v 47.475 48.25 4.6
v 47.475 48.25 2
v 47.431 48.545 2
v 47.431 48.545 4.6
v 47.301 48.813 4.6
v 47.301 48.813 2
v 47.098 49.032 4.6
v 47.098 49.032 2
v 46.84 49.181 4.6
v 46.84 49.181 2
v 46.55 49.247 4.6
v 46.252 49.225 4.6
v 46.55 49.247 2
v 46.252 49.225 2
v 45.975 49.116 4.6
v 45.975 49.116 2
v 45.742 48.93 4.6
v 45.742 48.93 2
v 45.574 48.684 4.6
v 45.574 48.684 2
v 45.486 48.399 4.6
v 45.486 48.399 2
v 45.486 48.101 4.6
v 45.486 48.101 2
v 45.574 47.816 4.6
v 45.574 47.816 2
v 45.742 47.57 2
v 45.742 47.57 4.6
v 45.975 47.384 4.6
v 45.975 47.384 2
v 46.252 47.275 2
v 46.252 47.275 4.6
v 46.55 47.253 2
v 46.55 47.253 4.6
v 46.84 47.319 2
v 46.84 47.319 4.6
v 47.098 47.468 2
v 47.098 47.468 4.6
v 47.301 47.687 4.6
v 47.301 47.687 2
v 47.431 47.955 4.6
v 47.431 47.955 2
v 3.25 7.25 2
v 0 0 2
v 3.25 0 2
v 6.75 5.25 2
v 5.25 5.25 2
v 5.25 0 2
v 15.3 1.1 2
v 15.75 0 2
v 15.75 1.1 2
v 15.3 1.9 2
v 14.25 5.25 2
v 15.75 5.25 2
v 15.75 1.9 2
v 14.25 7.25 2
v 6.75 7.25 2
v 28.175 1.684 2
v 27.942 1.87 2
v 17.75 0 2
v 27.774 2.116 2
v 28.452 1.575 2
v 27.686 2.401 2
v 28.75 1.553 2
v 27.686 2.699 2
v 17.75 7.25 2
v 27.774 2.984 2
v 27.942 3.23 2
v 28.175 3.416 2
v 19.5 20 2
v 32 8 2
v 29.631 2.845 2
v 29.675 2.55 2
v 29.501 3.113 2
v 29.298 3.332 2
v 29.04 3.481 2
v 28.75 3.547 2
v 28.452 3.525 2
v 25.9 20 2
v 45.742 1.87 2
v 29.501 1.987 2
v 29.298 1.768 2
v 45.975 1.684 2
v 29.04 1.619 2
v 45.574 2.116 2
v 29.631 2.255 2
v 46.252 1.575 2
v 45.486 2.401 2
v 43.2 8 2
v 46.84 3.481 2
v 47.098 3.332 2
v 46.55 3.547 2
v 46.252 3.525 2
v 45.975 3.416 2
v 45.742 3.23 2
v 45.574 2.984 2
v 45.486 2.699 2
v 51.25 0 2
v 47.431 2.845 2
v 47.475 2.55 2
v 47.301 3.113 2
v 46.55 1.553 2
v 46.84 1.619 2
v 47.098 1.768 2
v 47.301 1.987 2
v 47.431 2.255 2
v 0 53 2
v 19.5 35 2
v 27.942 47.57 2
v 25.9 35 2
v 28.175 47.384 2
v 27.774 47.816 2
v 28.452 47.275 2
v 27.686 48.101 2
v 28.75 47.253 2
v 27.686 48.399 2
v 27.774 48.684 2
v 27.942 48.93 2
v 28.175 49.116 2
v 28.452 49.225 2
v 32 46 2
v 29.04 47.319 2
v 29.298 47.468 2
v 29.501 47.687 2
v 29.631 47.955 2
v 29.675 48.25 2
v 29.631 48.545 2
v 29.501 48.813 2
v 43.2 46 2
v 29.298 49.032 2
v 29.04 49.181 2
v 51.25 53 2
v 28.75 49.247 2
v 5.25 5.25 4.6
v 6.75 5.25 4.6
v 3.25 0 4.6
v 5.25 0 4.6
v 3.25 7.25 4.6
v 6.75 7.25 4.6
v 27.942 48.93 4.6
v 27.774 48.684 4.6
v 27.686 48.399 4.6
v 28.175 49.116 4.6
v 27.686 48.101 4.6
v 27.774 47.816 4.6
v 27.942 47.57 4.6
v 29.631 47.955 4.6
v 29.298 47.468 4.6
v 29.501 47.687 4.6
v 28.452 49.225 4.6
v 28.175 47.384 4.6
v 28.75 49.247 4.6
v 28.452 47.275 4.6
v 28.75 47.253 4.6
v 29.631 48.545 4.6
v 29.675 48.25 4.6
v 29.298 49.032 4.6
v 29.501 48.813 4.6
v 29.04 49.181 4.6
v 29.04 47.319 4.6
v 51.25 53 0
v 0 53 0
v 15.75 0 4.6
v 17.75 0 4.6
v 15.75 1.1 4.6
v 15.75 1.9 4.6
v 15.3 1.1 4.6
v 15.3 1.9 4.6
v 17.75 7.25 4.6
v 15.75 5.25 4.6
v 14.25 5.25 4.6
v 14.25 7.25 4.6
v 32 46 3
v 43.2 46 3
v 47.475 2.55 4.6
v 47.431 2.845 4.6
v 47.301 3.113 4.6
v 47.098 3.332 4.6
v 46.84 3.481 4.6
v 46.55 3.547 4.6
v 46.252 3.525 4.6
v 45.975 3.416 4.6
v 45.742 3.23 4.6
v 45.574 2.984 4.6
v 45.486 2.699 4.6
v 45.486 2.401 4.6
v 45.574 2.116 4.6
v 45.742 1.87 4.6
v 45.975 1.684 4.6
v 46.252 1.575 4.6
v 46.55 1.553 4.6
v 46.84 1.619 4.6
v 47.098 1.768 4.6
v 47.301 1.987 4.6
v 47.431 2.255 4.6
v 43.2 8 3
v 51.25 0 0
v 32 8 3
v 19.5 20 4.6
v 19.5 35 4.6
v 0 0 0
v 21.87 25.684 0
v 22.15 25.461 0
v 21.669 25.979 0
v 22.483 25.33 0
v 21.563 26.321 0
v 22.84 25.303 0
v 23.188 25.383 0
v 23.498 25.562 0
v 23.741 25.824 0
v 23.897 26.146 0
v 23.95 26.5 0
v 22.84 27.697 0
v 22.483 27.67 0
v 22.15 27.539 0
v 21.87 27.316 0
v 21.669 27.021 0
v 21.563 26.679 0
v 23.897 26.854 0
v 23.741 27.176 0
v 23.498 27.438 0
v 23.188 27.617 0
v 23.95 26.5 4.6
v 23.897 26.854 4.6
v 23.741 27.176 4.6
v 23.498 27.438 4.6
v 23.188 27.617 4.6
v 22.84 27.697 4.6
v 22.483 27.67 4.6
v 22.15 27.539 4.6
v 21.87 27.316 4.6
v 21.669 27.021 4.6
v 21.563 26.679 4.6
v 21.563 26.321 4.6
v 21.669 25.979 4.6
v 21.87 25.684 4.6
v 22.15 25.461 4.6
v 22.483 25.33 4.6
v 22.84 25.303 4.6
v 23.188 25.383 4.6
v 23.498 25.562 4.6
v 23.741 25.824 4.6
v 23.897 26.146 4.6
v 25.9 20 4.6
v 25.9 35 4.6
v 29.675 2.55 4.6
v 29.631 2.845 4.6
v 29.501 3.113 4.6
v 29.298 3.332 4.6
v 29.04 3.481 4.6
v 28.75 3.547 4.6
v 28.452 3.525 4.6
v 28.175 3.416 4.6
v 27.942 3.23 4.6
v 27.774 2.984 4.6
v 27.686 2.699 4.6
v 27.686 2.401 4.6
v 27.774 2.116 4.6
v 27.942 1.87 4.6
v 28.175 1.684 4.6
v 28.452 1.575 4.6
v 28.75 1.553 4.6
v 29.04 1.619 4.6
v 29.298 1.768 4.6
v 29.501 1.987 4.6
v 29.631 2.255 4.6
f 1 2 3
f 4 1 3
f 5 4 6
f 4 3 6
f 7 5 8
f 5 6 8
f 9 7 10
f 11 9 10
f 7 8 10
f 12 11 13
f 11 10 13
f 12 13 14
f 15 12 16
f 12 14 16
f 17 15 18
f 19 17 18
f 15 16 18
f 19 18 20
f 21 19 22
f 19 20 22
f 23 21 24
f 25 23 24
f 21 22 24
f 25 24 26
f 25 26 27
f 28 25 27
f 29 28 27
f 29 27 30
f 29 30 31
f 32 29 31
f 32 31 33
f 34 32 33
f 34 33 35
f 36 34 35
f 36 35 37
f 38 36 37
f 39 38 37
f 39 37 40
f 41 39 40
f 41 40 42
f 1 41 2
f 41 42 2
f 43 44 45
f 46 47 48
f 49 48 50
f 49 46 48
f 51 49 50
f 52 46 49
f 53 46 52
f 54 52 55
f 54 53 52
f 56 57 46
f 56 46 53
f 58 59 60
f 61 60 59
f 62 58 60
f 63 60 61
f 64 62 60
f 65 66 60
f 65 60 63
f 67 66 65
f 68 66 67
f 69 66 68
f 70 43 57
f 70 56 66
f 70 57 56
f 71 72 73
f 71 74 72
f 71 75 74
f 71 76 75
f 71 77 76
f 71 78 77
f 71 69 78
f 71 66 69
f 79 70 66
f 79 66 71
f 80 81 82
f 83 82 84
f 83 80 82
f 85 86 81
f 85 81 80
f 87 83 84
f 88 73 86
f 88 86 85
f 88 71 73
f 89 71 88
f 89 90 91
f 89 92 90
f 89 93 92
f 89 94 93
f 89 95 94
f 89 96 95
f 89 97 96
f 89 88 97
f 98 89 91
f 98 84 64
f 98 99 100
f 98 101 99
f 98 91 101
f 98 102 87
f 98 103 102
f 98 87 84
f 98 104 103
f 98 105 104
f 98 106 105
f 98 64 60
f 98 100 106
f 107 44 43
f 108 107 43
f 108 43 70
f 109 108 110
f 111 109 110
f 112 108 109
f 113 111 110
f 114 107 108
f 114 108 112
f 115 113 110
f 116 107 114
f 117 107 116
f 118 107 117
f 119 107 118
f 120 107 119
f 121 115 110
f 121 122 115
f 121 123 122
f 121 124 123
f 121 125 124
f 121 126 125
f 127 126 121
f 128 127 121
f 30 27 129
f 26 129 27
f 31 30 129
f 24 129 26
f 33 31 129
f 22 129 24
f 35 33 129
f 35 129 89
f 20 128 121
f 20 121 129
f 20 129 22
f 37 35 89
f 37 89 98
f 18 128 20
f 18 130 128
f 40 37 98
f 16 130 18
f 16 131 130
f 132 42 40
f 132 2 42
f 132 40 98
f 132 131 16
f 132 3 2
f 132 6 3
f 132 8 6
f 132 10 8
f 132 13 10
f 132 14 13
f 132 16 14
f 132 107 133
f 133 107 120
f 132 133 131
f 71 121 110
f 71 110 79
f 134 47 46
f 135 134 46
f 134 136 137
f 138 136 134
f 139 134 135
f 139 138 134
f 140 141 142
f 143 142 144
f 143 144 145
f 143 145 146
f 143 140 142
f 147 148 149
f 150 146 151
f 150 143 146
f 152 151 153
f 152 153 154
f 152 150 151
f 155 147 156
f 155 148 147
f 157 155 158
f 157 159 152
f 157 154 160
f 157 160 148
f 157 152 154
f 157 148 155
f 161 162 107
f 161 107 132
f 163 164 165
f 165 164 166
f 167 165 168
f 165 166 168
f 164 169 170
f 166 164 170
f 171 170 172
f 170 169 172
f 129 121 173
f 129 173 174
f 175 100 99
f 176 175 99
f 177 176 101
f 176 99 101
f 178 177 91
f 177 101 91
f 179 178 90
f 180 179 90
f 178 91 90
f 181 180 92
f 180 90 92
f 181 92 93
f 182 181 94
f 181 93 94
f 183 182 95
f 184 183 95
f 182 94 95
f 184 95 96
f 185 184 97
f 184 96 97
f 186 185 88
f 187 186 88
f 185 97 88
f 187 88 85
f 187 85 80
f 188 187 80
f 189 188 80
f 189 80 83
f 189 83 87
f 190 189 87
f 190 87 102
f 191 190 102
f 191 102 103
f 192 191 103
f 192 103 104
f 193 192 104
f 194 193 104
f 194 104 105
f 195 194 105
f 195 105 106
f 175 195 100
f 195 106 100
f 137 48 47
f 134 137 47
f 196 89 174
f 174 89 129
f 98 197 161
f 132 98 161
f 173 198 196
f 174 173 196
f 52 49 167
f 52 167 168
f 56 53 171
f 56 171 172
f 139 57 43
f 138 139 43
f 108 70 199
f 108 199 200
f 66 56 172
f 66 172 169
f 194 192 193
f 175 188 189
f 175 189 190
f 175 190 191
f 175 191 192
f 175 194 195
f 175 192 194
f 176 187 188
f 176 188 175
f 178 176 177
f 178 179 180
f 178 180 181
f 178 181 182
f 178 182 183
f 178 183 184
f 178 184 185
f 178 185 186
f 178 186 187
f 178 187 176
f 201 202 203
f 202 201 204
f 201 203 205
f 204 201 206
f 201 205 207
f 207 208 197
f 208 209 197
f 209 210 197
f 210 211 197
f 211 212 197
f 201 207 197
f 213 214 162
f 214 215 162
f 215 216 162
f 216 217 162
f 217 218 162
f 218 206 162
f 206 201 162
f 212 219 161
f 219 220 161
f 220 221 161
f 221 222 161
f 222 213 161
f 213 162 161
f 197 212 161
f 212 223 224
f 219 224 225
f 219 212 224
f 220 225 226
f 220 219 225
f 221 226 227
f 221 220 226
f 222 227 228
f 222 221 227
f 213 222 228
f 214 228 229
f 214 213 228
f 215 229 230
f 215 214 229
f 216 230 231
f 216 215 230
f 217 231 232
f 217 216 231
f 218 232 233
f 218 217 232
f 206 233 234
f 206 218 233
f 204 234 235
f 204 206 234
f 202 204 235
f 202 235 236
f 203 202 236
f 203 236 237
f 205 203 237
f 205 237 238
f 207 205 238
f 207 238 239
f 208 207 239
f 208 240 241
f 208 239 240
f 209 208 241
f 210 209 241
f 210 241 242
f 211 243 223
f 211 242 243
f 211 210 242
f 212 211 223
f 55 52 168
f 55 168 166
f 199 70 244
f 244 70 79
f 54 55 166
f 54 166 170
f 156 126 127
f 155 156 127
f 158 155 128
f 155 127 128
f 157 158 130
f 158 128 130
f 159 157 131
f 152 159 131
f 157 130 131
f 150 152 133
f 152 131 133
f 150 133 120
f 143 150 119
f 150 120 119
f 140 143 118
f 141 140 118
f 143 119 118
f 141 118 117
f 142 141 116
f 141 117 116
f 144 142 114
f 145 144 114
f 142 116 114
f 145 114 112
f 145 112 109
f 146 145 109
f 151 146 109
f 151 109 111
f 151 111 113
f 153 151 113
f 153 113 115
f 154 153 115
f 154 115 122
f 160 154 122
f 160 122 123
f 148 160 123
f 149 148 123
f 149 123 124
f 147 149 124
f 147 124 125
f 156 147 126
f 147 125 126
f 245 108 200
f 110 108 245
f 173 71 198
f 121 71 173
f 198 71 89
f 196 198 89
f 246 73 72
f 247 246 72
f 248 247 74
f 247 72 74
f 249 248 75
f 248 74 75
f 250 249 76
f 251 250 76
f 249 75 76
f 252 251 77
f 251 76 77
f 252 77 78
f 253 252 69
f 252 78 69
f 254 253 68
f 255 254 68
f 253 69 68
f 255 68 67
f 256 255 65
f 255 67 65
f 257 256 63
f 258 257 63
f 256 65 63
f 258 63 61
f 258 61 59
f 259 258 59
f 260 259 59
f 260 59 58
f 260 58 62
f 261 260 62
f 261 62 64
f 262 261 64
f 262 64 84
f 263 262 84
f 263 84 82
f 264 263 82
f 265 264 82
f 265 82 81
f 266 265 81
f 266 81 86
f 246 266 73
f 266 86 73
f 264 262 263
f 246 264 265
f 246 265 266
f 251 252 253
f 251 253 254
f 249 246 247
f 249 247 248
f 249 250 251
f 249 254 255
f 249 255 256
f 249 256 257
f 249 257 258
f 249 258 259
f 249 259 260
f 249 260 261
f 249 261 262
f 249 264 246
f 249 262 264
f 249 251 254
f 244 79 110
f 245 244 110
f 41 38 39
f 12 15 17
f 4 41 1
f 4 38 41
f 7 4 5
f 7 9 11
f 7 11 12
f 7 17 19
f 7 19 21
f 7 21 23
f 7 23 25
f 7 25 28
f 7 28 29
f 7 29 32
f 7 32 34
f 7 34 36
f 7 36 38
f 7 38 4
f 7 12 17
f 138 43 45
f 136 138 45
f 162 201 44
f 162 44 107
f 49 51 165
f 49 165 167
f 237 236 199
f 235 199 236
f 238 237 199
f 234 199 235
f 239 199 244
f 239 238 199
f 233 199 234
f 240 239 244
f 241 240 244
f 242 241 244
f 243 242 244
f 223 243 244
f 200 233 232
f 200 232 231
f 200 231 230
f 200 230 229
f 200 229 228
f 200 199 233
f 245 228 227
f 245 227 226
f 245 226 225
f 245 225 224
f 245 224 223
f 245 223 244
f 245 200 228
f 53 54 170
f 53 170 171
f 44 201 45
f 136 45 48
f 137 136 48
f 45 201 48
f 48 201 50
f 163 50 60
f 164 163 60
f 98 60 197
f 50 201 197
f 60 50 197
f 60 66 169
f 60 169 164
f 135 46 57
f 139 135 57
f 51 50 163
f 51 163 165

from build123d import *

# Parameters (mm, degrees)
SKETCH013_R      = 1.65
EXTRUDE009_DEPTH = 5
SKETCH015_R      = 1.2
EXTRUDE011_DEPTH = 10
SKETCH006_W      = 11.2
SKETCH006_H      = 38
EXTRUDE001_DEPTH = 1
SKETCH007_R      = 1
SKETCH007_W      = 6.4
SKETCH007_H      = 15
EXTRUDE005_DEPTH = 2.6
SKETCH005_W      = 51.25
SKETCH005_H      = 53
EXTRUDE_DEPTH    = 2


with BuildPart() as basecut001:
    # Sketch013 → Extrude009 (new body)
    with BuildSketch(Plane.XY.offset(10.25)):
        with Locations((22.75, 26.5)):
            Circle(SKETCH013_R)
    extrude(amount=-EXTRUDE009_DEPTH)


with BuildPart() as basecuts:
    # Sketch015 → Extrude011 (new body)
    with BuildSketch(Plane.XY):
        with Locations((22.75, 26.5)):
            Circle(SKETCH015_R)
    extrude(amount=EXTRUDE011_DEPTH)

    # Fusion006: union baseCut001
    add(basecut001.part)


with BuildPart() as base002:
    # Sketch006 → Extrude001 (new body)
    with BuildSketch(Plane.XY.offset(2)):
        with Locations((37.6, 27)):
            Rectangle(SKETCH006_W, SKETCH006_H)
    extrude(amount=EXTRUDE001_DEPTH)


with BuildPart() as base003:
    # Sketch007 → Extrude005 (new body)
    with BuildSketch(Plane.XY.offset(2)):
        with Locations((28.675, 48.25)):
            Circle(SKETCH007_R)
        with Locations((46.475, 48.25)):
            Circle(SKETCH007_R)
        with Locations((28.675, 2.55)):
            Circle(SKETCH007_R)
        with Locations((46.475, 2.55)):
            Circle(SKETCH007_R)
        Polygon((3.25, 0), (5.25, 0), (5.25, 5.25), (6.75, 5.25), (6.75, 7.25), (3.25, 7.25), align=None)
        Polygon((17.75, 0), (15.75, 0), (15.75, 1.1), (15.3, 1.1), (15.3, 1.9), (15.75, 1.9), (15.75, 5.25), (14.25, 5.25), (14.25, 7.25), (17.75, 7.25), align=None)
        with Locations((22.7, 27.5)):
            Rectangle(SKETCH007_W, SKETCH007_H)
    extrude(amount=EXTRUDE005_DEPTH)


with BuildPart() as bottom:
    # Sketch005 → Extrude (new body)
    with BuildSketch(Plane.XY):
        with Locations((25.625, 26.5)):
            Rectangle(SKETCH005_W, SKETCH005_H)
    extrude(amount=EXTRUDE_DEPTH)

    # Fusion002: union base002, base003
    add(base002.part)
    add(base003.part)

    # Cut001: cut baseCuts
    add(basecuts.part, mode=Mode.SUBTRACT)


solid = bottom.part
